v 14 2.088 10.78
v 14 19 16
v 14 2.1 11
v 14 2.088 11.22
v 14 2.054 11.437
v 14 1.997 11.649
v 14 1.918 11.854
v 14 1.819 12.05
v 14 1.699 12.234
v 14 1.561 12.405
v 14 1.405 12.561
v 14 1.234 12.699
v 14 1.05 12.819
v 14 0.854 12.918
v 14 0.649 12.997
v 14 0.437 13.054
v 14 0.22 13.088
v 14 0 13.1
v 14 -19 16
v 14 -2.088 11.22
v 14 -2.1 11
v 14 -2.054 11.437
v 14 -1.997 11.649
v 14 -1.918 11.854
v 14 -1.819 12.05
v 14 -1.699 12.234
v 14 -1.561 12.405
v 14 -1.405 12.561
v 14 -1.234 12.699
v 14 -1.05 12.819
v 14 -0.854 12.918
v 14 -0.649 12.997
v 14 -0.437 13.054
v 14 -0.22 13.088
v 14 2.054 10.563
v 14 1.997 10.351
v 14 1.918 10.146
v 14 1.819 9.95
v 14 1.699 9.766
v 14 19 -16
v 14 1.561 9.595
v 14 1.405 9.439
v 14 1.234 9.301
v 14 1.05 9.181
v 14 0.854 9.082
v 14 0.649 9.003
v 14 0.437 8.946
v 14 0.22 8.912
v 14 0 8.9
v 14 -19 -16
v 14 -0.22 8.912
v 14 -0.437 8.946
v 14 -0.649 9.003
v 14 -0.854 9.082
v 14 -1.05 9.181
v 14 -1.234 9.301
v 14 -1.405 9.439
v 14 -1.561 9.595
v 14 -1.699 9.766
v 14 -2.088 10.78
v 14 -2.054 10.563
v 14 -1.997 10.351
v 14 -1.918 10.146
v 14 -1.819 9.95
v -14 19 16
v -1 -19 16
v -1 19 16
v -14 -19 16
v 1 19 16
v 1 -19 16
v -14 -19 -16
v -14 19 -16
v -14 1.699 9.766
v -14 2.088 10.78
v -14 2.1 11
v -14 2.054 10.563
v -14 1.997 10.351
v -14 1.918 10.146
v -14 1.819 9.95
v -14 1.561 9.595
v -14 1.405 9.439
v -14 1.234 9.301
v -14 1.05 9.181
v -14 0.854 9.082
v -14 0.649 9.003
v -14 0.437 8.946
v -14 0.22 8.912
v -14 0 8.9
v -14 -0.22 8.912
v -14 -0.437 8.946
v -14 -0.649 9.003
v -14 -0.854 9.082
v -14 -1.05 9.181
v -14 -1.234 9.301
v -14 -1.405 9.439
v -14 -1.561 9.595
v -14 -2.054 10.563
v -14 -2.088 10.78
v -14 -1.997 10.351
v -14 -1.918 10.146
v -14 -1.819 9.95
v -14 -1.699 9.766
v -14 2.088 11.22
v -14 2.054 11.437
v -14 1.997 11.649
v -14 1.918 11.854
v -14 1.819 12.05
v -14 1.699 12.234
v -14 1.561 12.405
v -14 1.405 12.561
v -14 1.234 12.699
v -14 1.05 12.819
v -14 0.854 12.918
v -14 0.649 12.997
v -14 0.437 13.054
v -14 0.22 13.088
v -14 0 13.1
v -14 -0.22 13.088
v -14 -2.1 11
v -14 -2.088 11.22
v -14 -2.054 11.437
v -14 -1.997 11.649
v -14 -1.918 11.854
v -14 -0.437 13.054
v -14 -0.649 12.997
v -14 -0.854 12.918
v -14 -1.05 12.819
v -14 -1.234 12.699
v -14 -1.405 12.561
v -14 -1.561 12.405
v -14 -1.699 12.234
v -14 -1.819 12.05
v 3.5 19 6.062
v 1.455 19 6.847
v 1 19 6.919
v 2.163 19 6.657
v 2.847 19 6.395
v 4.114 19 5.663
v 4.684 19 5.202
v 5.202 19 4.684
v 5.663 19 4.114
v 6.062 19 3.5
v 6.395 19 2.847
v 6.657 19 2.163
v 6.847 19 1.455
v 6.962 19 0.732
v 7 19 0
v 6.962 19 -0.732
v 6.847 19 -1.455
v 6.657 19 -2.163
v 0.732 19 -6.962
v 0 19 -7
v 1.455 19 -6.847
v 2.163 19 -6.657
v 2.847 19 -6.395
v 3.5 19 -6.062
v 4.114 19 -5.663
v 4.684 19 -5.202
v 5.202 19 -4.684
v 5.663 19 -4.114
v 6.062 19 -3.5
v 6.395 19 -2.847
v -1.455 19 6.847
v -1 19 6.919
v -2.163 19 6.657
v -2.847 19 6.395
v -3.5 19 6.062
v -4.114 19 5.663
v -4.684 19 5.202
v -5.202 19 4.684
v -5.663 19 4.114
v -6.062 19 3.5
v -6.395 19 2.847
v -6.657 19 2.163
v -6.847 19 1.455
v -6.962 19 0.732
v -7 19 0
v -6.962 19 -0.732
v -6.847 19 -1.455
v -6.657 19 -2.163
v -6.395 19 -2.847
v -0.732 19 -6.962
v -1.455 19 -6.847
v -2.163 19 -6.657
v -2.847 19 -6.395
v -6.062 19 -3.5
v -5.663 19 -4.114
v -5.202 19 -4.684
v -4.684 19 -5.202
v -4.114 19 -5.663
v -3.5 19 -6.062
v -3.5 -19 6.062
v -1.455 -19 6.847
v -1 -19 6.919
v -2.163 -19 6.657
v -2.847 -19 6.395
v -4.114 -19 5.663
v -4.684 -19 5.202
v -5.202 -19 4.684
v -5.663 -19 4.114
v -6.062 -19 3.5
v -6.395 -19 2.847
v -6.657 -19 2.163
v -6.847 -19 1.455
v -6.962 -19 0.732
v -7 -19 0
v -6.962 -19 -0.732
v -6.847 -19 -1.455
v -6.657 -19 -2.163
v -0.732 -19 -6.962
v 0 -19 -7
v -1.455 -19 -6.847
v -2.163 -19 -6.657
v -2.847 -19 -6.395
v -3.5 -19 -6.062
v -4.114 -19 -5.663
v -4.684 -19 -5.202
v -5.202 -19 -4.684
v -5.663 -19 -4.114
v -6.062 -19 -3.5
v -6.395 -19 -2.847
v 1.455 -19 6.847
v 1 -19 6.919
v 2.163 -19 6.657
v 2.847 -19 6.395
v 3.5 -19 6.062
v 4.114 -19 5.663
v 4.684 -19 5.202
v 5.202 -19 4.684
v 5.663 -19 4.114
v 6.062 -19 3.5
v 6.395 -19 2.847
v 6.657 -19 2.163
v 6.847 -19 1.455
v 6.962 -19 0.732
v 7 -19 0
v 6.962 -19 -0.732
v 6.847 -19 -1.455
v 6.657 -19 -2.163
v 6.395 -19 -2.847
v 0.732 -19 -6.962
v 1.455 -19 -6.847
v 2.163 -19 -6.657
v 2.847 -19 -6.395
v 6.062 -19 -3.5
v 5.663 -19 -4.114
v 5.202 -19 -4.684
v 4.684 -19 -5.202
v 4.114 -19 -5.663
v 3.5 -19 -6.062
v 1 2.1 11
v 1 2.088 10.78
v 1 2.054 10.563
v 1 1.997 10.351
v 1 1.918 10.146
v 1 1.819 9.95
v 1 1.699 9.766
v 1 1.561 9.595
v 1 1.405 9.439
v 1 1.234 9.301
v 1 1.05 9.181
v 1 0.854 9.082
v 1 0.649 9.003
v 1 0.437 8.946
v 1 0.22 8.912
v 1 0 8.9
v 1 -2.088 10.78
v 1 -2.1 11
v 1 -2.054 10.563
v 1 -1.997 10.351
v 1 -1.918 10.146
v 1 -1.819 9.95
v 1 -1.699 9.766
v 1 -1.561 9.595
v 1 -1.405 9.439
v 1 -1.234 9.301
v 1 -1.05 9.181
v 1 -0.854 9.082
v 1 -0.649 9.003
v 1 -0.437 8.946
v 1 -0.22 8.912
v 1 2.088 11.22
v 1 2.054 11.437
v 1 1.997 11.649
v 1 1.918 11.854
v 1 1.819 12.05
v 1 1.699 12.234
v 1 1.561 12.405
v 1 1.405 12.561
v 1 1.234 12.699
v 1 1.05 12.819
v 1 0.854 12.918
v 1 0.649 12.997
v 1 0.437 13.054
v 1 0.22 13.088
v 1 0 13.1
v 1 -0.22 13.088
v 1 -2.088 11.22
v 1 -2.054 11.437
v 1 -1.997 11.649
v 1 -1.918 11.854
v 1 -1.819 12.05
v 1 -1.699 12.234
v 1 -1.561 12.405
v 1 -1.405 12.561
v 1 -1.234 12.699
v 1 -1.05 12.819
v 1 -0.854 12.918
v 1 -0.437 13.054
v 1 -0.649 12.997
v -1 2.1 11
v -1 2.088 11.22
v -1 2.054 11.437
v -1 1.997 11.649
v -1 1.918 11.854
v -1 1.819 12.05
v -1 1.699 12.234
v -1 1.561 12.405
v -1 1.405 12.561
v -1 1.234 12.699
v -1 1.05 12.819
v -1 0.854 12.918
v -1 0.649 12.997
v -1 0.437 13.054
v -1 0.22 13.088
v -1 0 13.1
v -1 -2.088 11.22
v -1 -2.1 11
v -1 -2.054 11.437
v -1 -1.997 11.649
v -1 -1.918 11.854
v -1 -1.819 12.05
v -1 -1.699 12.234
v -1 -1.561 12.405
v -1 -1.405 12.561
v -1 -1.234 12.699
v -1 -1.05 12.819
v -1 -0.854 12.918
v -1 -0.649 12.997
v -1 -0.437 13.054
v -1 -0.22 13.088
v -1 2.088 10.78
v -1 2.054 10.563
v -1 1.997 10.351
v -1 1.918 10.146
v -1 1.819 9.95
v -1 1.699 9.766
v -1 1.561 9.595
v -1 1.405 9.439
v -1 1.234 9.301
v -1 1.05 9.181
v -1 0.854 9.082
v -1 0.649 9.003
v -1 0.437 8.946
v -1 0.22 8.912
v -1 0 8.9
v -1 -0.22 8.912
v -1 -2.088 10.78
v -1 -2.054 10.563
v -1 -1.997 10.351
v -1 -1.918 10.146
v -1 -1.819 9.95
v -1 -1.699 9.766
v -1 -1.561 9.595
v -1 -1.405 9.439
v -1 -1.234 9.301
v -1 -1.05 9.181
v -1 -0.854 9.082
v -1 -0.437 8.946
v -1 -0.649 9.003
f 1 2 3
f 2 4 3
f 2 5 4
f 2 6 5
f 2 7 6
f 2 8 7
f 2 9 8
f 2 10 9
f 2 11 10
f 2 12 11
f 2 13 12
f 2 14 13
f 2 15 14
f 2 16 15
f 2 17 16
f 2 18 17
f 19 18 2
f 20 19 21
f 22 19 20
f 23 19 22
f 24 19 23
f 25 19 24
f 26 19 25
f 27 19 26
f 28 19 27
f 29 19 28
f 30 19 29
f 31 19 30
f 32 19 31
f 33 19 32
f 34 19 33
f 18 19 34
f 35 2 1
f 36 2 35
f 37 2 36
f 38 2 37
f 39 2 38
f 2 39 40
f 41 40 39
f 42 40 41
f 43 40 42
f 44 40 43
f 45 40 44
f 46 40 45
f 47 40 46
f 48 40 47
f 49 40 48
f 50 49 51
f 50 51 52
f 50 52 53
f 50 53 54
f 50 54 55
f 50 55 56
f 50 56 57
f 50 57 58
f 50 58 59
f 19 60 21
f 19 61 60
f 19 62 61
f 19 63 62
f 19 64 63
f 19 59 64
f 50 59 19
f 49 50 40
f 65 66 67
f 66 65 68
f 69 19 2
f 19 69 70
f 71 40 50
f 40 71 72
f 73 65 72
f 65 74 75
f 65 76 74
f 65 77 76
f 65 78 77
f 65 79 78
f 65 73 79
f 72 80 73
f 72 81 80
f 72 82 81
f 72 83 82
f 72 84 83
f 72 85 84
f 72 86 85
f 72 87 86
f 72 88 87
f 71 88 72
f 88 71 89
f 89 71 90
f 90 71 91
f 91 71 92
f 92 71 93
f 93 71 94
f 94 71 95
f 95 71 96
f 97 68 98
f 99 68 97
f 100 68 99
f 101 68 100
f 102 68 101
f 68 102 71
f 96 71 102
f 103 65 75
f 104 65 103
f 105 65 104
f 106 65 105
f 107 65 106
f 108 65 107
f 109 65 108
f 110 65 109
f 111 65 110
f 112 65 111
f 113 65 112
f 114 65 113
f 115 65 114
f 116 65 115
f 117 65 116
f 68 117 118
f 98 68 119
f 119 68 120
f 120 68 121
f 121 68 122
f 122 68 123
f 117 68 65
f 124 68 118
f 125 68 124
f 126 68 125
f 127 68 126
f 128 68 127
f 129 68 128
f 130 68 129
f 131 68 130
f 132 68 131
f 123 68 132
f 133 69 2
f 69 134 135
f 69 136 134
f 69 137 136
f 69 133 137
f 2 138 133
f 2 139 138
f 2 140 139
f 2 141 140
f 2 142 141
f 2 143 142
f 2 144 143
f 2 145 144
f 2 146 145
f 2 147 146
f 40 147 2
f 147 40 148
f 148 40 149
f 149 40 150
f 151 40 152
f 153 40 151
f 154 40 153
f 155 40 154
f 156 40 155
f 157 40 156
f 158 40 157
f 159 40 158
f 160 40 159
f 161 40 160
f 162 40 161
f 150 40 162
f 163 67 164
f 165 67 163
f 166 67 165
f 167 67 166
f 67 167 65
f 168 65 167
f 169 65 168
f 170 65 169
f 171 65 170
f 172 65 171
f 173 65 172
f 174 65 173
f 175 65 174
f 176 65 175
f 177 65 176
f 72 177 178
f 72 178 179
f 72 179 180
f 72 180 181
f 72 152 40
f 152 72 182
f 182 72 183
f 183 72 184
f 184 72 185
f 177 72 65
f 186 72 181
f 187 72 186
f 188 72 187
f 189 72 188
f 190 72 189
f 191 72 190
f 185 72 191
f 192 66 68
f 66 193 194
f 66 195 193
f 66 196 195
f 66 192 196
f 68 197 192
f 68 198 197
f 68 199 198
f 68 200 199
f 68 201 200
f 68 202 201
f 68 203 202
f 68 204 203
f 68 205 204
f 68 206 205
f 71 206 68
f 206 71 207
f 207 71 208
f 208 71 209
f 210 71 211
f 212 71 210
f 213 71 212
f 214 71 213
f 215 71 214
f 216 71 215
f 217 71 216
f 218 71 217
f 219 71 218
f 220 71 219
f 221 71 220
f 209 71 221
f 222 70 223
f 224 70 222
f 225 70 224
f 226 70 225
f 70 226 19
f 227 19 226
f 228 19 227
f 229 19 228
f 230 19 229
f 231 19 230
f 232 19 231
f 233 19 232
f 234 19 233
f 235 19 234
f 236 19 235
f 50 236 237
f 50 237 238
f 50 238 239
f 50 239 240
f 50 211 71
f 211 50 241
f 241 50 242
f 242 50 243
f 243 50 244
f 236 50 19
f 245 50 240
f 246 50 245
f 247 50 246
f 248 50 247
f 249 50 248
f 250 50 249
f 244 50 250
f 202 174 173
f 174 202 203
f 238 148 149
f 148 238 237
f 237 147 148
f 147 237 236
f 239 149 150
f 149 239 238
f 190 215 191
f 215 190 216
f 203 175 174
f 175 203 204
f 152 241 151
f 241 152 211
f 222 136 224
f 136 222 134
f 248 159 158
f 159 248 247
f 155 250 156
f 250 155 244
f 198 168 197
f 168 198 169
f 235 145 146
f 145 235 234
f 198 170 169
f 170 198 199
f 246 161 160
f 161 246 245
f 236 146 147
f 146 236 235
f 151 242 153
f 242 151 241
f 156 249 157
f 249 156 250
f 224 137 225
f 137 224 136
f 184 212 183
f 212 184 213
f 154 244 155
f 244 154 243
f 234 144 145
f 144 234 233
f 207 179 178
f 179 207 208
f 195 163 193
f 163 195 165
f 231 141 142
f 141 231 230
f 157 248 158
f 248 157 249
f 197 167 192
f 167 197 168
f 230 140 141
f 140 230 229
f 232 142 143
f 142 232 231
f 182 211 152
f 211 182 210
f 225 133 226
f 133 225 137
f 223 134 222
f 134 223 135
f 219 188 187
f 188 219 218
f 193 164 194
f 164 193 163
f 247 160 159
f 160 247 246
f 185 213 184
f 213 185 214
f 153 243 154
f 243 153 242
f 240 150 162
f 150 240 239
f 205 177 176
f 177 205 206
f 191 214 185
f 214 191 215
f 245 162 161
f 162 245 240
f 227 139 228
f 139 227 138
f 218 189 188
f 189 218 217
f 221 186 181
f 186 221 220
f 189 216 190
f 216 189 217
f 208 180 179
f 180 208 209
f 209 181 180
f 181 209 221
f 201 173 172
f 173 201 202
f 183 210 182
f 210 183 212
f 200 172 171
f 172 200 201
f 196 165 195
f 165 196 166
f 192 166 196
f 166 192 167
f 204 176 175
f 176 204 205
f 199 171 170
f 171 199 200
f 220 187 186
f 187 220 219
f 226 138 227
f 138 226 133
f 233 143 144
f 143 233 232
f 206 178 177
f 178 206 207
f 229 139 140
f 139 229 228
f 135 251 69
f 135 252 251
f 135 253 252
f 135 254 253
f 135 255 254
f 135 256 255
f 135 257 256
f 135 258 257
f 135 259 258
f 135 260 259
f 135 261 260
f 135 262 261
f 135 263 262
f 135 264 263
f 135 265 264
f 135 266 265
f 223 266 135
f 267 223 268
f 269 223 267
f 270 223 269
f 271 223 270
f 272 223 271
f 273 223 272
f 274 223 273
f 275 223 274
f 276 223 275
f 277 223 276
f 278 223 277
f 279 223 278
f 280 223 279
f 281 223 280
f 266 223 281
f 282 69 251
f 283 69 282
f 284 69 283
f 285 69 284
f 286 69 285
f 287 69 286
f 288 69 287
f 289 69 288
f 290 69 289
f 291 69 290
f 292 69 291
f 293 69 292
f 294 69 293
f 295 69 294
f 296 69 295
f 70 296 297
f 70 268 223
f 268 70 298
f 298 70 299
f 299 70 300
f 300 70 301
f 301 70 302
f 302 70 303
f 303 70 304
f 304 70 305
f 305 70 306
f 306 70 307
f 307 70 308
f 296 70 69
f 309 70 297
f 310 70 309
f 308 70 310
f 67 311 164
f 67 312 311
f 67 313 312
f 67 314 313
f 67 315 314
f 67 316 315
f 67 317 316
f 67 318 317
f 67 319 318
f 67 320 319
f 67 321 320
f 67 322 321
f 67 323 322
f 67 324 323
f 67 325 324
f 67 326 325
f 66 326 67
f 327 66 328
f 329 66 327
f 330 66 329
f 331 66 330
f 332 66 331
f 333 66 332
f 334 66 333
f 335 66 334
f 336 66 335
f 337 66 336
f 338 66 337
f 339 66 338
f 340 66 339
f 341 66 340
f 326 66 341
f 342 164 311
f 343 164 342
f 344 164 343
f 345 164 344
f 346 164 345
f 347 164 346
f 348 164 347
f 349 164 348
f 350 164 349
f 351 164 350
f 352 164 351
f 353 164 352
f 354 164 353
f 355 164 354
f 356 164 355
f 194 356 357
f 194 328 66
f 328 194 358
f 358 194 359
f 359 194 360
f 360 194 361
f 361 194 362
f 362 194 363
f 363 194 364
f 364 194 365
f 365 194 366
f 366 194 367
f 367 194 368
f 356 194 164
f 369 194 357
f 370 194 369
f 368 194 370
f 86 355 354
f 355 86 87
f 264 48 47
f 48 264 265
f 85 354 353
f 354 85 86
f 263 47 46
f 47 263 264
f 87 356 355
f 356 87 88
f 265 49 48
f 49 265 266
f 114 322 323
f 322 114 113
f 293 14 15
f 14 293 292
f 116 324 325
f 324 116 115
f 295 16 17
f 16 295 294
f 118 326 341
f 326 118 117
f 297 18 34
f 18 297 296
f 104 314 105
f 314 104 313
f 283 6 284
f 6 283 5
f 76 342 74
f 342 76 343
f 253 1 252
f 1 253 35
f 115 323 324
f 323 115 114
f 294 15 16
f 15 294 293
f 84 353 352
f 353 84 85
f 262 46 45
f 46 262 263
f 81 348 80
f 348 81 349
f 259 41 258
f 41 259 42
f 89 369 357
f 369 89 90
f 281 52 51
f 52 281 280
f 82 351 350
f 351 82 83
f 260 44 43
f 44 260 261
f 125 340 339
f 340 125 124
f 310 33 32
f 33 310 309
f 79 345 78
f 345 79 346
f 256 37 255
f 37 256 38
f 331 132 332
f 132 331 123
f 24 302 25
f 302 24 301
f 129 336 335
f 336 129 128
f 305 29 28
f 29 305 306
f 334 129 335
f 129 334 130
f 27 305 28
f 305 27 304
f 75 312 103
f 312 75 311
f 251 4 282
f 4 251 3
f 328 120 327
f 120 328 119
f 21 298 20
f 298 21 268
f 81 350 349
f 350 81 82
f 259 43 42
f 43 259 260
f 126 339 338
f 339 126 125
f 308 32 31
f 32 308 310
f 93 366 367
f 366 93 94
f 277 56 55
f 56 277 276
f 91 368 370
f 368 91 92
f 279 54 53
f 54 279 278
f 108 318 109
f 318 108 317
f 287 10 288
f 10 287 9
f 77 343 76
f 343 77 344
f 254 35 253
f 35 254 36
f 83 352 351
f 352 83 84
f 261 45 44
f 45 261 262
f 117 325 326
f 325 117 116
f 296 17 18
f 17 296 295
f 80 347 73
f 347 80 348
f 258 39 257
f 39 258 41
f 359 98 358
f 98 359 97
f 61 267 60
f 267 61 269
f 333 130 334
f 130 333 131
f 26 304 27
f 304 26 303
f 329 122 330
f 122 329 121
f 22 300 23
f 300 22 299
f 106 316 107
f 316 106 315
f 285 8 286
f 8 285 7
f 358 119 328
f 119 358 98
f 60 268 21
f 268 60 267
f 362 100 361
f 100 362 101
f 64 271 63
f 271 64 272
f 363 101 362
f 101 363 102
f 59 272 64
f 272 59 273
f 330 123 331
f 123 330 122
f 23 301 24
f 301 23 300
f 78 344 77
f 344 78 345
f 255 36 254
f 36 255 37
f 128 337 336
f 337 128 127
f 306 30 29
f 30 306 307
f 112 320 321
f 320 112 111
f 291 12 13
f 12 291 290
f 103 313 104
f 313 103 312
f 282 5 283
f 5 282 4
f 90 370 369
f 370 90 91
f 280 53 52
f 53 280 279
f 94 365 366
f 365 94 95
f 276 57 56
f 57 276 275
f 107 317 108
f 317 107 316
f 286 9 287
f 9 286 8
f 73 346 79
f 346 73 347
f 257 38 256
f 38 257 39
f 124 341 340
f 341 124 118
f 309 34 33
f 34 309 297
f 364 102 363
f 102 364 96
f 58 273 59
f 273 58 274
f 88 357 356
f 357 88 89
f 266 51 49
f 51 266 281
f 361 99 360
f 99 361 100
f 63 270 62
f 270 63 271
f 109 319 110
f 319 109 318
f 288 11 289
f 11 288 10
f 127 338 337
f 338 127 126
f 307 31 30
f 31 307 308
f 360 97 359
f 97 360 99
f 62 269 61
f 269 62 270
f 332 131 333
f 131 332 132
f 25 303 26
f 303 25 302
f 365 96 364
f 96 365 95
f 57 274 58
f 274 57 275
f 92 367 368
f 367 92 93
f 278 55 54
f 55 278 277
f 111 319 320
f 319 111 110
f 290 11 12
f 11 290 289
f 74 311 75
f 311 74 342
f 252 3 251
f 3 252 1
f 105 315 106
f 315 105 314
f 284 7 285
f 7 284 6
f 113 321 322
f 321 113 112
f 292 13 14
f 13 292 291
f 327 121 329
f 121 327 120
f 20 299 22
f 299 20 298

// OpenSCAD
// Split clamp block.
$fn = 60;
eps = 0.02;
bore_d = 14;
body_w = 38;
body_h = 32;
body_l = 28;
slot_w = 2;
difference() {
    cube([body_l, body_w, body_h], center = true);
    translate([0, -body_w / 2 - eps, 0]) rotate([-90,0,0]) cylinder(d = bore_d, h = body_w + 2 * eps);
    translate([-slot_w / 2, -body_w / 2 - eps, 0]) cube([slot_w, body_w + 2 * eps, body_h / 2 + eps]);
    translate([-body_l / 2 - eps, 0, body_h / 2 - 5]) rotate([0,90,0]) cylinder(d = 4.2, h = body_l + 2 * eps);
}
